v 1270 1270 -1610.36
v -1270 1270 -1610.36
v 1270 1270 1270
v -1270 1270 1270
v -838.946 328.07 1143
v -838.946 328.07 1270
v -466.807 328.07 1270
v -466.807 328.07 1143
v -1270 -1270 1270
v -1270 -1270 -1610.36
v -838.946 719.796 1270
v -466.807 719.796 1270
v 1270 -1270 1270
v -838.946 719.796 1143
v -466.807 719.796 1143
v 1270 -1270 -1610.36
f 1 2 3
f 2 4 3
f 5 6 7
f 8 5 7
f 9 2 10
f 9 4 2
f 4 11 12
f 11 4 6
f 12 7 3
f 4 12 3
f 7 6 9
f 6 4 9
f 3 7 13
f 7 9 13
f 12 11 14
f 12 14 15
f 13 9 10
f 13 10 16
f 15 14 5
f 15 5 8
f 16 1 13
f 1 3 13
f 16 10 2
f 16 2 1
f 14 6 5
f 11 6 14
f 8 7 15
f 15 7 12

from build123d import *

# Parameters (mm, degrees)
F1_W      = 2540
F1_H      = 2540
F2_DEPTH  = 1270
F3_W      = 372.1394836903
F3_H      = 391.725808382
F4_DEPTH  = 127
F5_W      = 2540
F5_H      = 2540
F5_W_2    = 372.1394836903
F5_H_2    = 391.725808382
F6_DEPTH  = 127
F7_DEPTH  = 127
F8_DEPTH  = 127
F6_FACE_W = 2540
F6_FACE_H = 2540
F9_DEPTH  = 213.36


# Not quite as in the source:
# - a variable given as a bare number and used for a length is read in inches; the dataset says mm whatever the document's units were


with BuildPart() as f2:
    # F1 (on Front) → F2 (new body, symmetric)
    with BuildSketch(Plane.XZ):
        Rectangle(F1_W, F1_H)
    extrude(amount=F2_DEPTH, both=True)

    # F3 (on face) → F4 (cut)
    with BuildSketch(Plane.XY.offset(1270)):
        with Locations((-652.8763622046, 523.9332765341)):
            Rectangle(F3_W, F3_H)
    extrude(amount=-F4_DEPTH, mode=Mode.SUBTRACT)

    # F5 (on face) → F6 (join)
    with BuildSketch(Plane(origin=(0, 0, -1270), x_dir=(1, 0, 0), z_dir=(0, 0, -1))):
        Rectangle(F5_W, F5_H)
        with Locations((-652.8763622046, -523.9332765341)):
            Rectangle(F5_W_2, F5_H_2, mode=Mode.SUBTRACT)
        with Locations((-652.8763622046, -523.9332765341)):
            Rectangle(F5_W_2, F5_H_2)
    extrude(amount=F6_DEPTH)

    # F5 (on face) → F7 (join)
    with BuildSketch(Plane(origin=(0, 0, -1270), x_dir=(1, 0, 0), z_dir=(0, 0, -1))):
        with Locations((-652.8763622046, -523.9332765341)):
            Rectangle(F5_W_2, F5_H_2)
    extrude(amount=F7_DEPTH)

    # F5 (on face) → F8 (join)
    with BuildSketch(Plane(origin=(0, 0, -1270), x_dir=(1, 0, 0), z_dir=(0, 0, -1))):
        with Locations((-652.8763622046, -523.9332765341)):
            Rectangle(F5_W_2, F5_H_2)
    extrude(amount=F8_DEPTH)

    # F5 (on face) + F6_face (on face) → F9 (join)
    with BuildSketch(Plane(origin=(0, 0, -1270), x_dir=(1, 0, 0), z_dir=(0, 0, -1))):
        with Locations((-652.8763622046, -523.9332765341)):
            Rectangle(F5_W_2, F5_H_2)
    with BuildSketch(Plane(origin=(0, 0, -1397), x_dir=(1, 0, 0), z_dir=(0, 0, -1))):
        Rectangle(F6_FACE_W, F6_FACE_H)
    extrude(amount=F9_DEPTH)


solid = f2.part
